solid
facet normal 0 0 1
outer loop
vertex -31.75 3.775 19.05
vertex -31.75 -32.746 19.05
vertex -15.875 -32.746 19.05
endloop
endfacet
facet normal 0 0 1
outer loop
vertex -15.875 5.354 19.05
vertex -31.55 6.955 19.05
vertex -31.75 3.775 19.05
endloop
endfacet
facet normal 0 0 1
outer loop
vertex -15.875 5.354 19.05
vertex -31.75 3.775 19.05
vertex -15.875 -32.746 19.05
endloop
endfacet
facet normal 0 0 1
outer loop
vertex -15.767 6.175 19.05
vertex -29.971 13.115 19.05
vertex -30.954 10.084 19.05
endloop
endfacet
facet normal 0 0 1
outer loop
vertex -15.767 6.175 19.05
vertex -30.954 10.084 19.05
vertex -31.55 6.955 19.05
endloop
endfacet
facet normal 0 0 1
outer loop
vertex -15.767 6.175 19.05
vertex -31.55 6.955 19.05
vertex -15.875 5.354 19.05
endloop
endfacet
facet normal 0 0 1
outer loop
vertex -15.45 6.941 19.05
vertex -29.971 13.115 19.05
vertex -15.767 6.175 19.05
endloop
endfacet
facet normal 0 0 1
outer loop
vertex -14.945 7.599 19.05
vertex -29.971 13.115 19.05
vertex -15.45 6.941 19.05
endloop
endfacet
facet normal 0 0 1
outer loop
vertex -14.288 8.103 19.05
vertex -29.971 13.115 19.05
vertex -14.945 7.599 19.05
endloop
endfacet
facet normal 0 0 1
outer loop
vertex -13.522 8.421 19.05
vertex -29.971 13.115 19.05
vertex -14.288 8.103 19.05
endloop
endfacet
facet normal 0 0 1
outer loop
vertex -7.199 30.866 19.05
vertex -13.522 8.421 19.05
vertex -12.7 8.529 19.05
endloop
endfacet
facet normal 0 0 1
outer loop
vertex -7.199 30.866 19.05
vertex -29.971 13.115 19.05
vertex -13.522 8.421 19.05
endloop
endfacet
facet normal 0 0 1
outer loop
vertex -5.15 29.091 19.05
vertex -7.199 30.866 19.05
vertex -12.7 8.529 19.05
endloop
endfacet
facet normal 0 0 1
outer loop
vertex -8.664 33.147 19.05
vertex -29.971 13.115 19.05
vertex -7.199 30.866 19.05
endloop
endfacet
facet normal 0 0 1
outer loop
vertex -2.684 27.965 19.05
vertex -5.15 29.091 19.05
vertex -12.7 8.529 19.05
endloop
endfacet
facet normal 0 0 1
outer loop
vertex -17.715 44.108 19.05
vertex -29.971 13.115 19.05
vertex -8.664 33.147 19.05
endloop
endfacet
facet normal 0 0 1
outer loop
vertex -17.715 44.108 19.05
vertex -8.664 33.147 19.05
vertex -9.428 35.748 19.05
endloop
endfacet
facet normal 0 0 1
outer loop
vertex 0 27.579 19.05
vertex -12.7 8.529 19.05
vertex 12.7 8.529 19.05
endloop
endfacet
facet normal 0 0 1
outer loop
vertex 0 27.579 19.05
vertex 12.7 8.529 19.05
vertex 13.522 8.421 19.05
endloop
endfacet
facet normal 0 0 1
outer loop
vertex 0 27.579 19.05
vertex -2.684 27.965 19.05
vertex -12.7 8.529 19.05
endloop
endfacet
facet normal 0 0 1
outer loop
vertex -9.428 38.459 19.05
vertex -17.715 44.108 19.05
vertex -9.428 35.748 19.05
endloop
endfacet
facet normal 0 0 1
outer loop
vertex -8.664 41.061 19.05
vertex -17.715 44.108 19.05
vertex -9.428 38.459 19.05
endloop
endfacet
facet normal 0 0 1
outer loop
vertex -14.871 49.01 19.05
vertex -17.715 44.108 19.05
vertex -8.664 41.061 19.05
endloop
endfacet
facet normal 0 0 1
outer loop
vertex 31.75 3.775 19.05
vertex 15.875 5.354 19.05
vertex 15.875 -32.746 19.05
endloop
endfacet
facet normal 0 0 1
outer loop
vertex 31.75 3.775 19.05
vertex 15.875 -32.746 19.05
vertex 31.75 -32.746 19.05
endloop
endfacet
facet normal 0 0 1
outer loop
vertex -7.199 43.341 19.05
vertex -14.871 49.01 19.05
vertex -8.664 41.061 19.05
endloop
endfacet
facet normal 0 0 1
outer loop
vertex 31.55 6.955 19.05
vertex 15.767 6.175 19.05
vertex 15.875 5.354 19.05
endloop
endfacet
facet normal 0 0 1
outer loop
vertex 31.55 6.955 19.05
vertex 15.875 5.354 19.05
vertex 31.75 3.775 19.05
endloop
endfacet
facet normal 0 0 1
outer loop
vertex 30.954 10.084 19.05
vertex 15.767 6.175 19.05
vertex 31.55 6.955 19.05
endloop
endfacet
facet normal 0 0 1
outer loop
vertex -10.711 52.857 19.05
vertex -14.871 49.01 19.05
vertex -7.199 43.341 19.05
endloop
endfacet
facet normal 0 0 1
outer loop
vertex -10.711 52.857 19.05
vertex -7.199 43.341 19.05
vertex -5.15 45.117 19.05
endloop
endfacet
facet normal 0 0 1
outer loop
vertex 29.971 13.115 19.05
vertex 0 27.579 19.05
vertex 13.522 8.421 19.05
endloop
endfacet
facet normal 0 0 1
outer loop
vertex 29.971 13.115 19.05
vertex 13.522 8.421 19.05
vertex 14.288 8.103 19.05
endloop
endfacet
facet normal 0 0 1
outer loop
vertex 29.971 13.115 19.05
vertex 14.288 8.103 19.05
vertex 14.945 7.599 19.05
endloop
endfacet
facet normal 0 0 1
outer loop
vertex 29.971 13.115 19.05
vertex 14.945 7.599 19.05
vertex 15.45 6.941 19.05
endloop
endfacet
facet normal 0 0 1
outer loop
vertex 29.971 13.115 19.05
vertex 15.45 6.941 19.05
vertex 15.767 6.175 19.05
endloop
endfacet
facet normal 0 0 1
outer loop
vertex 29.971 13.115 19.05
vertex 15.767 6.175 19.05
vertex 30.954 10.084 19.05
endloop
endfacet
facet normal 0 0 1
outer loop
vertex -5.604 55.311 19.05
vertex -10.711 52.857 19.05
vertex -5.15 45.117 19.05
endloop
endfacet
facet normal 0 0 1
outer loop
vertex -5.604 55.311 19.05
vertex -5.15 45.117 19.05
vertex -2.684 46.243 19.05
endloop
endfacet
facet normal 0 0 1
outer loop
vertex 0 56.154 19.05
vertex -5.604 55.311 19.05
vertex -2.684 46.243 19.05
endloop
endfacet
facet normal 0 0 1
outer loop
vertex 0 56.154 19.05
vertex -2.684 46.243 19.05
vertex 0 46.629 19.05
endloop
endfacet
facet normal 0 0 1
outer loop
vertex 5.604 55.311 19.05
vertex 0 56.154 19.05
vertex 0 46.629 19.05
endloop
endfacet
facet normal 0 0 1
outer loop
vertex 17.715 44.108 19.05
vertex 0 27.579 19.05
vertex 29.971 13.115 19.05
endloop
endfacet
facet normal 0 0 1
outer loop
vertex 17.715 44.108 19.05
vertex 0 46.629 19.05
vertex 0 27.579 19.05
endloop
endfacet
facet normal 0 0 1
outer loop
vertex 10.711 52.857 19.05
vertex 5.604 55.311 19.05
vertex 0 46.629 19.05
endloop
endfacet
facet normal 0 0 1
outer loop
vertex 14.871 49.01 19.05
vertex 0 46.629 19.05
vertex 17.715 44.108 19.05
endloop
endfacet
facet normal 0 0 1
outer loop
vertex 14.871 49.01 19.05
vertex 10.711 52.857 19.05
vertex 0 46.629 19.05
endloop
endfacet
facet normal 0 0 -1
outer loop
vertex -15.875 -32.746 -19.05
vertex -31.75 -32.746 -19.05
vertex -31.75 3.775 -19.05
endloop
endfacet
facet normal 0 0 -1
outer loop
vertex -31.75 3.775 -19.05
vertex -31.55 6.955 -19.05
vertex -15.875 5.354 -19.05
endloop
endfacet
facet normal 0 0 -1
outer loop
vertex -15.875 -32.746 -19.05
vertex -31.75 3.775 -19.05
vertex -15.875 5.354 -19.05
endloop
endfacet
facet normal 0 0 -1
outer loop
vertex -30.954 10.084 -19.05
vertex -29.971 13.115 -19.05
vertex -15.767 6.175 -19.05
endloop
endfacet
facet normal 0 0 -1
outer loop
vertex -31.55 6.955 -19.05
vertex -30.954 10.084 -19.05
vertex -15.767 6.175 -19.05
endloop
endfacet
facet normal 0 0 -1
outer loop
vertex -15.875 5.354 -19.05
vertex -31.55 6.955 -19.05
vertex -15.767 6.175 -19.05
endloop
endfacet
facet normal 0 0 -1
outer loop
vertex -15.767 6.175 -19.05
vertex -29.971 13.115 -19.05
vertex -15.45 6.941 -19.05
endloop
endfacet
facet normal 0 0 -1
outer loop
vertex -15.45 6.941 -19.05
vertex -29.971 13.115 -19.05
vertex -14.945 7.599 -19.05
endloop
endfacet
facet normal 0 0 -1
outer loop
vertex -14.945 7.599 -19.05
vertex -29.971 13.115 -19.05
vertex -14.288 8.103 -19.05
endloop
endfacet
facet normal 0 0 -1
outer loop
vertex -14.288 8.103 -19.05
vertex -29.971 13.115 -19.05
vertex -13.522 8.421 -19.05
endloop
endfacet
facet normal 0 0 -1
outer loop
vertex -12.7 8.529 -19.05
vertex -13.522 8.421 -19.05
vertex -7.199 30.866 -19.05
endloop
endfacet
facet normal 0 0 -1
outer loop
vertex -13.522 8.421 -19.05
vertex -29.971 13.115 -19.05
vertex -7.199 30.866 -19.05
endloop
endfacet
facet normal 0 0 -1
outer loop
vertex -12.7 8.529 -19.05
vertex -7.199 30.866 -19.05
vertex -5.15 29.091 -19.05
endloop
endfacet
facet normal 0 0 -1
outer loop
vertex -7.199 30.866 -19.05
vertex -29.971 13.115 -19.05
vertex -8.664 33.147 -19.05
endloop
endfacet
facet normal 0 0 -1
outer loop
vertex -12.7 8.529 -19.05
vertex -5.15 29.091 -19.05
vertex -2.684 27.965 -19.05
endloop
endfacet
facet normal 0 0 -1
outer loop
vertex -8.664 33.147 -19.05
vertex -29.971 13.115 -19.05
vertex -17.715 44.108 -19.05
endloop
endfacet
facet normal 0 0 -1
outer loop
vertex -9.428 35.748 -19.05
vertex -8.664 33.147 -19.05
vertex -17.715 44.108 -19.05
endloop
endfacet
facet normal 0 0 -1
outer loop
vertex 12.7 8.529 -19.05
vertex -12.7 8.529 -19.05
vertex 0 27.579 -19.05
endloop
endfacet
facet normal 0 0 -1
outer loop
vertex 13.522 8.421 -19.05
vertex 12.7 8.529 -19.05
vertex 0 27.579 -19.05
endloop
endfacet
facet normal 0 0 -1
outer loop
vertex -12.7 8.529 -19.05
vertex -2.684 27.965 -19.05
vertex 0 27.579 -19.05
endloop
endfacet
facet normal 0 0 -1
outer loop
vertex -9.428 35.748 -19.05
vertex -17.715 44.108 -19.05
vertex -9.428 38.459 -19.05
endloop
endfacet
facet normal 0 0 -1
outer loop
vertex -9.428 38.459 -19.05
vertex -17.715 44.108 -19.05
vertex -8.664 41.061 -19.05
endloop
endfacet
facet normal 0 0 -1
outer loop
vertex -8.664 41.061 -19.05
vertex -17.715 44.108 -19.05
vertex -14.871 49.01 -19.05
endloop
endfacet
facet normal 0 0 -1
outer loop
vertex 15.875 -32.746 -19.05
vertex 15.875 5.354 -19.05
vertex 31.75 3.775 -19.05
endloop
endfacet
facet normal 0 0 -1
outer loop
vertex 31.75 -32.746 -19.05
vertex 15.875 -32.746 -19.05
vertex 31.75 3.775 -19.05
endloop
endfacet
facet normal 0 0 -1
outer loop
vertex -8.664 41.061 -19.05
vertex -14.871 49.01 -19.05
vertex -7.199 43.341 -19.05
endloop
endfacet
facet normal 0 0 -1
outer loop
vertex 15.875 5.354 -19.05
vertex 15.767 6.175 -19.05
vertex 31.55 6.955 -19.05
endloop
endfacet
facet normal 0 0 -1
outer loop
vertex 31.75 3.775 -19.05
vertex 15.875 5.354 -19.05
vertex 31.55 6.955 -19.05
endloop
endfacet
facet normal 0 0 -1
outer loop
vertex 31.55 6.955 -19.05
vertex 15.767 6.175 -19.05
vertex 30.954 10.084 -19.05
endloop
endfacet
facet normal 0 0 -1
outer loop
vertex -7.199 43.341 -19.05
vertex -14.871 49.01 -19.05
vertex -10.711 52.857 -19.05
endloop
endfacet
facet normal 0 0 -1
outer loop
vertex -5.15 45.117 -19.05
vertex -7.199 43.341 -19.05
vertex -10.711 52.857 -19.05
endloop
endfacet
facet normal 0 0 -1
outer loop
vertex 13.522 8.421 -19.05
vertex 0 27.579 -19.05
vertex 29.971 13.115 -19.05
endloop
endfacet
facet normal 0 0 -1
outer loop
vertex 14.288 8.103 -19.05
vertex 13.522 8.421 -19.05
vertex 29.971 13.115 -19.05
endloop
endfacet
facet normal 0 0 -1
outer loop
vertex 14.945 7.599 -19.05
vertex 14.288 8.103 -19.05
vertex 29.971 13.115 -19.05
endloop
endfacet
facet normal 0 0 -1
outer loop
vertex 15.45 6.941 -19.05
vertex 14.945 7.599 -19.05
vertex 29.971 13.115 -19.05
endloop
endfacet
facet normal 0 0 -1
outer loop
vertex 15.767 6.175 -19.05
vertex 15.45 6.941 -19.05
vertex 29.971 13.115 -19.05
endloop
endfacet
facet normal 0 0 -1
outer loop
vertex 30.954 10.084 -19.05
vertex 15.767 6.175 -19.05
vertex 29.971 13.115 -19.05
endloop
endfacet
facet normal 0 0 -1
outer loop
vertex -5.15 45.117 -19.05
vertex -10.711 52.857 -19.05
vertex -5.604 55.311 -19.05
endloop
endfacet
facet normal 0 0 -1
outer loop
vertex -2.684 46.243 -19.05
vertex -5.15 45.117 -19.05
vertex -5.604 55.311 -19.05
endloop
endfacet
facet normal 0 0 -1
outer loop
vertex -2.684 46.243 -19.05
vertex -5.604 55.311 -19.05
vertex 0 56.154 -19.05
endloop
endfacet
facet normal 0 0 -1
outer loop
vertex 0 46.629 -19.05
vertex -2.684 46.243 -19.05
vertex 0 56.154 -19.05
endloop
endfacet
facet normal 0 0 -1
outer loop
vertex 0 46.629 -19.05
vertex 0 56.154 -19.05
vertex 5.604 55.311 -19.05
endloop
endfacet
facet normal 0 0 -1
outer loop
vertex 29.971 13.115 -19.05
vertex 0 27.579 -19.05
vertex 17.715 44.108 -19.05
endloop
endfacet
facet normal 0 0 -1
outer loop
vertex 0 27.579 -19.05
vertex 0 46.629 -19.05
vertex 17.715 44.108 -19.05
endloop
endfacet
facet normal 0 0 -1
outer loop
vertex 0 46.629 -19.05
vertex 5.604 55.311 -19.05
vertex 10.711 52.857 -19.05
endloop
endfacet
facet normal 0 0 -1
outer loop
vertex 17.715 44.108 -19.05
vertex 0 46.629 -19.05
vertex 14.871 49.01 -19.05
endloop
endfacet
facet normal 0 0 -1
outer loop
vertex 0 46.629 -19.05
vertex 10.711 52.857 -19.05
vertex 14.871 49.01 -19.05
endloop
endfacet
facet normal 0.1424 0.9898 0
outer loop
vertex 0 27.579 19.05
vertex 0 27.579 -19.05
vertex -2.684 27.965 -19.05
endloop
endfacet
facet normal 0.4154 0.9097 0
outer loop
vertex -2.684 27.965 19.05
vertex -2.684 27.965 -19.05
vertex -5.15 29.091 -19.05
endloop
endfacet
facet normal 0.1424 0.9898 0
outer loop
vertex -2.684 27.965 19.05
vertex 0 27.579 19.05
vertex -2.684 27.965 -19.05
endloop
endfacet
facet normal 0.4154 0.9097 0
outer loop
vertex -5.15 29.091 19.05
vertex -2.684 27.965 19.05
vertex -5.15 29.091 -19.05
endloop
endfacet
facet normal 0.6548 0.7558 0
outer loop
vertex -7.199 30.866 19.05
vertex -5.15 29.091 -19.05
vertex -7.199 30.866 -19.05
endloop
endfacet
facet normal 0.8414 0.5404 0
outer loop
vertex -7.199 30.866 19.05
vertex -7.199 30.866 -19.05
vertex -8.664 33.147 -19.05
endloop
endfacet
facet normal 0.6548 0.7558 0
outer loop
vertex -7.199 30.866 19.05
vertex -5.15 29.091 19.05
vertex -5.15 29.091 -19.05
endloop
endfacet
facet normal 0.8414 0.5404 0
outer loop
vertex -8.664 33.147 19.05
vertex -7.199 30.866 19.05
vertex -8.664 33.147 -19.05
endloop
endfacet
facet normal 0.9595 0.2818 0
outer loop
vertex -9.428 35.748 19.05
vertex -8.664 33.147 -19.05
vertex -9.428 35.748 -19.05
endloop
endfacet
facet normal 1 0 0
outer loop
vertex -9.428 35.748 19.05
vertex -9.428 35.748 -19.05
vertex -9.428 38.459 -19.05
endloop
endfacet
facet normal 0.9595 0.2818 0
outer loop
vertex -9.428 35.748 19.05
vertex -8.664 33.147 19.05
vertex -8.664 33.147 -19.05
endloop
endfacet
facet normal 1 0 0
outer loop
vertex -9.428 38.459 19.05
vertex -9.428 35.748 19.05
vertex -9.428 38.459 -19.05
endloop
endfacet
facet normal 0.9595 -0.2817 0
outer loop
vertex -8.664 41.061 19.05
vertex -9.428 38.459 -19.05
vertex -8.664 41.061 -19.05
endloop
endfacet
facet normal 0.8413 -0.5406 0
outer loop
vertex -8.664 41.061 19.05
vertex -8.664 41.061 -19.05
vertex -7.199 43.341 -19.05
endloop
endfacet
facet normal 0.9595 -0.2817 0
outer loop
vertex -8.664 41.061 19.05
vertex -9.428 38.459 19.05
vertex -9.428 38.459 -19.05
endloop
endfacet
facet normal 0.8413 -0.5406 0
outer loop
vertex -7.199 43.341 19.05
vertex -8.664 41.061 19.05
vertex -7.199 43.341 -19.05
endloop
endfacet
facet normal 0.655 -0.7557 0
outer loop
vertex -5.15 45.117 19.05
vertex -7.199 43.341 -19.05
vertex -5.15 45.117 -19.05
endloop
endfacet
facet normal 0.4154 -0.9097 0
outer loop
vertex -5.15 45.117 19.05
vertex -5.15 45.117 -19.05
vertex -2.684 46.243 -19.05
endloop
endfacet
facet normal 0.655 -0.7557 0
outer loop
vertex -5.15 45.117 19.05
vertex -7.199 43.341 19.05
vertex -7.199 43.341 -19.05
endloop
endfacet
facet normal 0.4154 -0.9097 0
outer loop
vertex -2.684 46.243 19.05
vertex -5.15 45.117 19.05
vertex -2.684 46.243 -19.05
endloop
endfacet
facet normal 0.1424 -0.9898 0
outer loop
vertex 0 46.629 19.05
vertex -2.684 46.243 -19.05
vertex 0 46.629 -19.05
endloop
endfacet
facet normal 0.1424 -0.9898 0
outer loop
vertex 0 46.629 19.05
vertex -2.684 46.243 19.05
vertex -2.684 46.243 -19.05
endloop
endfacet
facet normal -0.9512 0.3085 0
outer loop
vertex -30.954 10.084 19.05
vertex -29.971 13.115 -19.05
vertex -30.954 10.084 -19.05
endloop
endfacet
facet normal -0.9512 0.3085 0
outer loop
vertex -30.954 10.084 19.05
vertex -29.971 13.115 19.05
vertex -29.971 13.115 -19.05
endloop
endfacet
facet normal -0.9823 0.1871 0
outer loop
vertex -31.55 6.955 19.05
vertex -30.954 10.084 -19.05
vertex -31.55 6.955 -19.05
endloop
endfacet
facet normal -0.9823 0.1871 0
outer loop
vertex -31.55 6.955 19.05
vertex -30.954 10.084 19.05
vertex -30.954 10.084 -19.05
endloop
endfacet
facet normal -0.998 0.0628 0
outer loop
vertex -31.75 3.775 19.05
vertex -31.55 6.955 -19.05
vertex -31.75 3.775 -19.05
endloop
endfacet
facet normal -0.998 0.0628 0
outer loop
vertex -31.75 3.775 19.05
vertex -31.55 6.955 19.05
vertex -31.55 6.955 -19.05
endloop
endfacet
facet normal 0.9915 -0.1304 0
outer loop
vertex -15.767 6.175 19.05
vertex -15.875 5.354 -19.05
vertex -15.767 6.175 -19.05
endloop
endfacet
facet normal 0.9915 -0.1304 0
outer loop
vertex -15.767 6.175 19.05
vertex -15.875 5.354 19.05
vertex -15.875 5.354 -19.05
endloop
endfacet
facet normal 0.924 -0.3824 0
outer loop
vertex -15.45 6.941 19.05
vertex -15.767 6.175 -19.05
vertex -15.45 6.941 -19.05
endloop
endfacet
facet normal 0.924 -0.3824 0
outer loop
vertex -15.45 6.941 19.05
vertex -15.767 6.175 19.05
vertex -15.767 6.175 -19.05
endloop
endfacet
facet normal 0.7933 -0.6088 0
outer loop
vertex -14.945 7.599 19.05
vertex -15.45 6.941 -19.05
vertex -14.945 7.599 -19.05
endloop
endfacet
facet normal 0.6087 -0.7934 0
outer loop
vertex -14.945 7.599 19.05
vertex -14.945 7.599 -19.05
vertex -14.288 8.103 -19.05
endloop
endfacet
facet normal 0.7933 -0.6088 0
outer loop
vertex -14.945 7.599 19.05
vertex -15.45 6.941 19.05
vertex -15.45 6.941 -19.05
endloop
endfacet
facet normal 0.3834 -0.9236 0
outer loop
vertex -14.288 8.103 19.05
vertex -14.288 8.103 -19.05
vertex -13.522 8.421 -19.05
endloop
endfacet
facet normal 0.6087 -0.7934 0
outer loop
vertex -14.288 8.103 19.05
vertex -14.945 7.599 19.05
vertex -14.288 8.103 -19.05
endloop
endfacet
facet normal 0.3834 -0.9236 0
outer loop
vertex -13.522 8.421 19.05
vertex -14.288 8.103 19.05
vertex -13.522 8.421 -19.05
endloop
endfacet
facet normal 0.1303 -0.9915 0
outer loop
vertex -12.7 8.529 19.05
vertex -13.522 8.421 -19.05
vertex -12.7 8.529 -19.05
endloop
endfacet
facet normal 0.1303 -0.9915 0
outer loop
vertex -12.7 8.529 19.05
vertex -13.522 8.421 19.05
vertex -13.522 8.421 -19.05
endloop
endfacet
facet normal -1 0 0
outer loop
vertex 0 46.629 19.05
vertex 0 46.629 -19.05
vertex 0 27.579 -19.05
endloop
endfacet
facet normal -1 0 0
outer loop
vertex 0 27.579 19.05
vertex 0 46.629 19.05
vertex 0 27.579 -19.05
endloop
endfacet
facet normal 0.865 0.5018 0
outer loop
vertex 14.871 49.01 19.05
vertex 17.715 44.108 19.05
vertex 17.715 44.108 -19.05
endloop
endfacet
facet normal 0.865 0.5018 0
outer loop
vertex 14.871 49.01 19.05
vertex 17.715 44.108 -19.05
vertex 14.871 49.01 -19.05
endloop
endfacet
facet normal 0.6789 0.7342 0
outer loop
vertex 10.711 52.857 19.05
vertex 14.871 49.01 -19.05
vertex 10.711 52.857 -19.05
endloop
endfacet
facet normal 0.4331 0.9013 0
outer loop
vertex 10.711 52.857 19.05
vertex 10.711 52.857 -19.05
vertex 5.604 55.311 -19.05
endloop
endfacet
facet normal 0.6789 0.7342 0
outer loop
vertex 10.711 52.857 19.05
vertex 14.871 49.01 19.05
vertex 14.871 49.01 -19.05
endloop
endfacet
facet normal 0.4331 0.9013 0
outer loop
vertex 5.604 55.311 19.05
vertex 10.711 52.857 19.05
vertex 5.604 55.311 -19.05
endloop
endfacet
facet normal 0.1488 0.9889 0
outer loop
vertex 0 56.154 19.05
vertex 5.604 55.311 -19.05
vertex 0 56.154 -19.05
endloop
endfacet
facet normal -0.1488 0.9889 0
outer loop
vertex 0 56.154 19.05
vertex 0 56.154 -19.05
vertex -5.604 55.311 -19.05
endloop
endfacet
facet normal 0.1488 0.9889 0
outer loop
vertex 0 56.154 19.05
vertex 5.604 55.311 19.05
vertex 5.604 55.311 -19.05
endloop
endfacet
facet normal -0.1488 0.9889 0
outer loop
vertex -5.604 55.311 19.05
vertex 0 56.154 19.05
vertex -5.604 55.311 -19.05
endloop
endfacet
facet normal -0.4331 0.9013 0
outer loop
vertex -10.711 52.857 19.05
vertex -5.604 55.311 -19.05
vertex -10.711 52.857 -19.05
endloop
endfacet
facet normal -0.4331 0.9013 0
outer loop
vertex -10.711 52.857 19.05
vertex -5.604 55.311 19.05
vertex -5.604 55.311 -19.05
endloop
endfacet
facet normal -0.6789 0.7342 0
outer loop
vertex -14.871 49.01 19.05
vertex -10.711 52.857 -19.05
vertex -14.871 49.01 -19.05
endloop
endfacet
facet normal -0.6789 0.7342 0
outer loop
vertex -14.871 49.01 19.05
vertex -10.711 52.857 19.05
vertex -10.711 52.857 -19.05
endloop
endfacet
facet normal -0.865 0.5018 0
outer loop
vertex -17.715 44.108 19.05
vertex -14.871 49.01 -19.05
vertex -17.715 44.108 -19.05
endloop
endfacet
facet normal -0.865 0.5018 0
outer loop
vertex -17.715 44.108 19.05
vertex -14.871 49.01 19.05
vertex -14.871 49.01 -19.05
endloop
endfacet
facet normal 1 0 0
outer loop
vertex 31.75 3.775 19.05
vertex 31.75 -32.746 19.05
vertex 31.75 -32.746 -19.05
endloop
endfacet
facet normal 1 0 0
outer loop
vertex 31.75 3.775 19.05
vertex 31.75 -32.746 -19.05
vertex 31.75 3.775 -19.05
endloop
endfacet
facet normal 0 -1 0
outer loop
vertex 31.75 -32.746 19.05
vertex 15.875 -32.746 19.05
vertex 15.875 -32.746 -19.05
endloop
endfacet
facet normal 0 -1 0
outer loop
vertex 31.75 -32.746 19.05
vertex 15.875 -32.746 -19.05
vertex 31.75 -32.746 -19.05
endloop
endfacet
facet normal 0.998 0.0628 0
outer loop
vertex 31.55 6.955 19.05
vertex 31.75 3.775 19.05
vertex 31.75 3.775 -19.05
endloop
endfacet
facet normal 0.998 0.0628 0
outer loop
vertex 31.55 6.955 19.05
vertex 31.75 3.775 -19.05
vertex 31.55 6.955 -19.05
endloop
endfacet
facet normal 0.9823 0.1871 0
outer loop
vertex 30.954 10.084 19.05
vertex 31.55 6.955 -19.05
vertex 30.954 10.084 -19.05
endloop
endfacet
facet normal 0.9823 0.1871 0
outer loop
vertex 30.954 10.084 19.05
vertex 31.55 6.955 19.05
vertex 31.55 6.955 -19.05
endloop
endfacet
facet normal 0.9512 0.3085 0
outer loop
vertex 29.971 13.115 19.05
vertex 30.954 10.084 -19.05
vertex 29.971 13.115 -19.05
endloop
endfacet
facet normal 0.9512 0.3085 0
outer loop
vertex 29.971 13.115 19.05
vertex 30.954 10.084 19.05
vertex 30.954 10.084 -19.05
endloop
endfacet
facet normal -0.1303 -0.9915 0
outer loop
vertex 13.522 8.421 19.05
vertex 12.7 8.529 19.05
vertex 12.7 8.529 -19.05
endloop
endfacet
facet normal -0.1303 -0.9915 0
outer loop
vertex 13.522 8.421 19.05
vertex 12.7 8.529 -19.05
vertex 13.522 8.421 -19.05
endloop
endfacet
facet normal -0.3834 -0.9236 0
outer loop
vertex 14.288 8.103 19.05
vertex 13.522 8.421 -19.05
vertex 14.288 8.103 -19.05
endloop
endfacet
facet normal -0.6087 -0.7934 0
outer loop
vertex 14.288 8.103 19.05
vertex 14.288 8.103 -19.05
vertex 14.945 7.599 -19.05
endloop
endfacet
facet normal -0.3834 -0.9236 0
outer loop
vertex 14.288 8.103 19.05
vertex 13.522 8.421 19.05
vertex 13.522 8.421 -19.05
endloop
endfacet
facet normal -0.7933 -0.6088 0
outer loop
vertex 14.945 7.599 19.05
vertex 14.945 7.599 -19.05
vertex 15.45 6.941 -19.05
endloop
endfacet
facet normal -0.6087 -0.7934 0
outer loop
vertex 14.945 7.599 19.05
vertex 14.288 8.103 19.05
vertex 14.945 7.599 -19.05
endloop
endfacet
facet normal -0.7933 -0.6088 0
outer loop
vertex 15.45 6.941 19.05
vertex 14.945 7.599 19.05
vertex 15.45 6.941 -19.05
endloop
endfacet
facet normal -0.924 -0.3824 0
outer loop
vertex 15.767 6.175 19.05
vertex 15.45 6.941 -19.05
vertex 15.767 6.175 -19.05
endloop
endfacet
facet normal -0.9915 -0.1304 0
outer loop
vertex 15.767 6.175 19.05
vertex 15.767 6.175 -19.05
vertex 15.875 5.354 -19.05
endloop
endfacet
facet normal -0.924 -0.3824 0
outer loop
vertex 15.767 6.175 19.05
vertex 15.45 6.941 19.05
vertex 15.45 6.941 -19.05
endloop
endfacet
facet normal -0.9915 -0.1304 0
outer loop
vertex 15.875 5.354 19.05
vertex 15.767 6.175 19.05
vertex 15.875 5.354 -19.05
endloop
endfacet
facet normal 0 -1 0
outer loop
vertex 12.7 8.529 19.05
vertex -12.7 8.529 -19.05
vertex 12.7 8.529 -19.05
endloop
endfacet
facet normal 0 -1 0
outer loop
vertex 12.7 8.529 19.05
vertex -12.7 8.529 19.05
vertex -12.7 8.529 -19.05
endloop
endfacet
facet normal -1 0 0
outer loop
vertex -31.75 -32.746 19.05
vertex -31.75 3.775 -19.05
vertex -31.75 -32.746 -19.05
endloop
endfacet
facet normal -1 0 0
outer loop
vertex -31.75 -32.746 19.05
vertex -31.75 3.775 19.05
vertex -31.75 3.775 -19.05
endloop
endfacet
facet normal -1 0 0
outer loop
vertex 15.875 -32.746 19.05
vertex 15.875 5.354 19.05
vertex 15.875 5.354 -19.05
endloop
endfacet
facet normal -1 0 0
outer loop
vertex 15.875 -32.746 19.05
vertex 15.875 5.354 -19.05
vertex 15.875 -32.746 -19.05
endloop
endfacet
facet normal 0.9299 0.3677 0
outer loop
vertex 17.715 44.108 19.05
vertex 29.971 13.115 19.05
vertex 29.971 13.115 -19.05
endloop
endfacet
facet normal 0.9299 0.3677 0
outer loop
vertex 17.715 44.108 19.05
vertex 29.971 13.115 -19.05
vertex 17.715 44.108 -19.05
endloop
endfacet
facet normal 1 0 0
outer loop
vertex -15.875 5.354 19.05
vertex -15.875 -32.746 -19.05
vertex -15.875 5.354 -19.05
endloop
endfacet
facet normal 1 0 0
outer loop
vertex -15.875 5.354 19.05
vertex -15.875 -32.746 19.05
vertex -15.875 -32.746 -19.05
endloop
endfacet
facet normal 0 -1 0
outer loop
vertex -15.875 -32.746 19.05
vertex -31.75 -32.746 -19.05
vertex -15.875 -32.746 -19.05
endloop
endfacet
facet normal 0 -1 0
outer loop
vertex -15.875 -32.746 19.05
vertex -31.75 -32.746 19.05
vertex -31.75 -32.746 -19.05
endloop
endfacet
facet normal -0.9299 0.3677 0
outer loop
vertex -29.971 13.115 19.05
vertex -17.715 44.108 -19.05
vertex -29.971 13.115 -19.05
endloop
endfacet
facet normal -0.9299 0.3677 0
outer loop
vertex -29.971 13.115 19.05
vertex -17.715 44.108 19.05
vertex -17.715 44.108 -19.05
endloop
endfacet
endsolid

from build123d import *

# Parameters (mm, degrees)
BOSS_EXTRUDE1_DEPTH = 19.05


with BuildPart() as part:
    # Sketch1 → Boss-Extrude1 (new, symmetric)
    with BuildSketch(Plane.XY):
        with BuildLine():
            Line((-12.7, 8.528712184), (0, 8.528712184))
            Line((0, 8.528712184), (12.7, 8.528712184))
            ThreePointArc((12.7, 8.528712184), (14.94506403, 7.598776215), (15.875, 5.353712184))
            Line((15.875, 5.353712184), (15.875, -32.746287816))
            Line((15.875, -32.746287816), (31.75, -32.746287816))
            Line((31.75, -32.746287816), (31.75, 3.774872893))
            ThreePointArc((31.75, 3.774872893), (31.301172558, 8.528712184), (29.970552126, 13.11454726))
            Line((29.970552126, 13.11454726), (17.715414094, 44.108467959))
            ThreePointArc((17.715414094, 44.108467959), (0, 56.153712184), (-17.715414094, 44.108467959))
            Line((-17.715414094, 44.108467959), (-29.970552126, 13.11454726))
            ThreePointArc((-29.970552126, 13.11454726), (-31.301172558, 8.528712184), (-31.75, 3.774872893))
            Line((-31.75, 3.774872893), (-31.75, -32.746287816))
            Line((-31.75, -32.746287816), (-15.875, -32.746287816))
            Line((-15.875, -32.746287816), (-15.875, 5.353712184))
            ThreePointArc((-15.875, 5.353712184), (-14.94506403, 7.598776215), (-12.7, 8.528712184))
        make_face()
        with BuildLine():
            Line((0, 46.628712184), (0, 27.578712184))
            ThreePointArc((0, 27.578712184), (-9.525, 37.103712184), (0, 46.628712184))
        make_face(mode=Mode.SUBTRACT)
    extrude(amount=BOSS_EXTRUDE1_DEPTH, both=True)


solid = part.part
